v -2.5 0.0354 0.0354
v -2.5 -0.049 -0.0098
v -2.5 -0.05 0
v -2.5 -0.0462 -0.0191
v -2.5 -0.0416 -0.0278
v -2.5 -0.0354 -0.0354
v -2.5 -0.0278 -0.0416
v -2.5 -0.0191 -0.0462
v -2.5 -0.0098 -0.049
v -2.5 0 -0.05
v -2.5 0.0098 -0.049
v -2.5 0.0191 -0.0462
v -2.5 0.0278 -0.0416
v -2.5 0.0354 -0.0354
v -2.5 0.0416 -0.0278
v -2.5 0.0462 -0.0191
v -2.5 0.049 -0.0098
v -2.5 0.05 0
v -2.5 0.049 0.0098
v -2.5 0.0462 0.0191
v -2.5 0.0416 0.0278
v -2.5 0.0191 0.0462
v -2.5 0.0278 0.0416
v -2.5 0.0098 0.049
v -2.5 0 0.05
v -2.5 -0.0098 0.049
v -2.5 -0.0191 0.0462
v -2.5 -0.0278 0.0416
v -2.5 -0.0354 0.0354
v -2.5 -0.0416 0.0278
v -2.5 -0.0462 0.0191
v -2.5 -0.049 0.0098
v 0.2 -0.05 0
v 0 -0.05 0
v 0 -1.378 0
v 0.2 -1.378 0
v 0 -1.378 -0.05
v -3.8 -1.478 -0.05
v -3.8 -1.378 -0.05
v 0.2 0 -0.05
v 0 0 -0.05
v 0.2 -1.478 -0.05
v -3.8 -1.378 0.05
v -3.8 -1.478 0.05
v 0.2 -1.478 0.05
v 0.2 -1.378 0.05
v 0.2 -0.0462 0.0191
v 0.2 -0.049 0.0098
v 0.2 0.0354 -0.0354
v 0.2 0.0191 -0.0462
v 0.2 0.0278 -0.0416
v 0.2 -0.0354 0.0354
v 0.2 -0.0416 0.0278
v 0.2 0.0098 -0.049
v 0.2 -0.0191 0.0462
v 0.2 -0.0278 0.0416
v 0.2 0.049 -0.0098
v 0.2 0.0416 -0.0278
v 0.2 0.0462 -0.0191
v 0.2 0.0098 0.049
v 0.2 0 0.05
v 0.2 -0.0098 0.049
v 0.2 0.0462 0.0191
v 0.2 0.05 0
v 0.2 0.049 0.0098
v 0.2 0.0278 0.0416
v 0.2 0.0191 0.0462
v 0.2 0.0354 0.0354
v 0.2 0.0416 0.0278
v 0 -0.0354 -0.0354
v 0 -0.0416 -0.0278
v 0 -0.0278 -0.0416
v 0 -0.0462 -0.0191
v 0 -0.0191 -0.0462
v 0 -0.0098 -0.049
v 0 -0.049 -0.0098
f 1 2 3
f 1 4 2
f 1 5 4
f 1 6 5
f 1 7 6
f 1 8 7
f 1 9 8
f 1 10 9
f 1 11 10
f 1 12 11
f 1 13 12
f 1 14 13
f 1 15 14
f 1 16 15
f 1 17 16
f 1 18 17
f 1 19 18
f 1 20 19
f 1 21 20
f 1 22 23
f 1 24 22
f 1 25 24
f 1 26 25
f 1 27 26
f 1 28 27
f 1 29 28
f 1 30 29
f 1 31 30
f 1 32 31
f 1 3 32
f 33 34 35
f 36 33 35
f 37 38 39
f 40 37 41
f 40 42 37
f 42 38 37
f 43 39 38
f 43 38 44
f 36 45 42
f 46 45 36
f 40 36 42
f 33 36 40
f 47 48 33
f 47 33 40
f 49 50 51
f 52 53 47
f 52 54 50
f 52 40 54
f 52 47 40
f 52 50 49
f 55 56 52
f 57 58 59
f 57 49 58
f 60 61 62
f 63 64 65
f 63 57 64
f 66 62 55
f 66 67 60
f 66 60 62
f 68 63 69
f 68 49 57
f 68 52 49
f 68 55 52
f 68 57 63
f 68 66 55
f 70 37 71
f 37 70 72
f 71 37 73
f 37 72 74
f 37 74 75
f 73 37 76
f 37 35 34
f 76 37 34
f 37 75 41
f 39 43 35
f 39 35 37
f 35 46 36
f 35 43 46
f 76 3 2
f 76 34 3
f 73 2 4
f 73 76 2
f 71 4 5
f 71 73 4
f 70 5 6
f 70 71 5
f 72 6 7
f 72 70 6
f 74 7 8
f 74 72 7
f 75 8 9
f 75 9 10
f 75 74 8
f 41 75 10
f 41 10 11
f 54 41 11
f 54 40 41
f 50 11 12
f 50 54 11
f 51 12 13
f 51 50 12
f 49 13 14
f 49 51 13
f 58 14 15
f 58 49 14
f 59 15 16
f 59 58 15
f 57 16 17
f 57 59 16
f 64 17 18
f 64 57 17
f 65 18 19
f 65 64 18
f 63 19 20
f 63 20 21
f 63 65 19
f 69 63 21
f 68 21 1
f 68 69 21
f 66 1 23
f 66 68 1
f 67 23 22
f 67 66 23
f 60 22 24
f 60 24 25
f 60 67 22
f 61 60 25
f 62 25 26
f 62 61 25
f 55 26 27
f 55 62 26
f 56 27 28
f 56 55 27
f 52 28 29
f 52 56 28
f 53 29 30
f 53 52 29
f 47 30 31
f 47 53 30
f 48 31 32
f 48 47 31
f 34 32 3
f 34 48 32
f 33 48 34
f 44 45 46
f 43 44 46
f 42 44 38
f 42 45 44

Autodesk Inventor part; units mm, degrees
ref_plane "YZ Plane" through (0, 0, 0) normal (1, 0, 0) x (0, 1, 0)
ref_plane "XZ Plane" through (0, 0, 0) normal (0, 1, 0) x (-1, 0, 0)
ref_plane "XY Plane" through (0, 0, 0) normal (0, 0, 1) x (1, 0, 0)
sketch "Sketch1" plane through (0, 0, 0) normal (1, 0, 0) x (0, 1, 0)
  circle A0 centre (0, 0) radius 0.05
  line L0 (0, 0) -> (-1.428, 0)
  line L1 (-1.478, 0.05) -> (-1.378, 0.05)
  line L2 (-1.378, 0.05) -> (-1.378, -0.05)
  line L3 (-1.378, -0.05) -> (-1.478, -0.05)
  line L4 (-1.478, -0.05) -> (-1.478, 0.05)
  line L5 (-1.478, 0.05) -> (-1.378, -0.05) construction
  line L6 (-1.378, 0.05) -> (-1.478, -0.05) construction
  line L7 (-1.378, -0.05) -> (0, -0.05)
  point P0 (-0.05, 0)
  point P1 (-1.378, 0)
  dimension "d0" = 0.1
  dimension "d1" = 1.428
  dimension "d2" = 0.1
  dimension "d3" = 0.1
extrude "Extrusion1" add sketch "Sketch1" along normal blind 0.2
sketch "Sketch2" plane through (0, 0, 0) normal (-1, 0, 0) x (0, 0, 1)
  arc A0 (0, -0.05) -> (-0.05, 0) centre (0, 0) ccw projected
  circle A1 centre (0, 0) radius 0.05
  point P0 (-0.05, 0)
  point P1 (0, -0.05)
  dimension "d6" = 0.1
extrude "Extrusion2" add sketch "Sketch2" along normal blind 2.5
sketch "Sketch3" plane through (0, 0, 0) normal (-1, 0, 0) x (0, 0, 1)
  line L0 (-0.05, -1.478) -> (-0.05, 0) projected
  line L1 (0.05, -1.478) -> (-0.05, -1.478) projected
  line L2 (-0.05, -1.478) -> (0.05, -1.478)
  line L3 (0, -1.378) -> (0.05, -1.378) projected
  line L4 (0.05, -1.478) -> (0.05, -1.378)
  line L5 (0.05, -1.378) -> (-0.05, -1.378)
  line L6 (-0.05, -1.378) -> (-0.05, -1.478)
  point P0 (0, 0)
extrude "Extrusion3" add sketch "Sketch3" along normal blind 3.8
properties part number "Bone17_16_Fix"
